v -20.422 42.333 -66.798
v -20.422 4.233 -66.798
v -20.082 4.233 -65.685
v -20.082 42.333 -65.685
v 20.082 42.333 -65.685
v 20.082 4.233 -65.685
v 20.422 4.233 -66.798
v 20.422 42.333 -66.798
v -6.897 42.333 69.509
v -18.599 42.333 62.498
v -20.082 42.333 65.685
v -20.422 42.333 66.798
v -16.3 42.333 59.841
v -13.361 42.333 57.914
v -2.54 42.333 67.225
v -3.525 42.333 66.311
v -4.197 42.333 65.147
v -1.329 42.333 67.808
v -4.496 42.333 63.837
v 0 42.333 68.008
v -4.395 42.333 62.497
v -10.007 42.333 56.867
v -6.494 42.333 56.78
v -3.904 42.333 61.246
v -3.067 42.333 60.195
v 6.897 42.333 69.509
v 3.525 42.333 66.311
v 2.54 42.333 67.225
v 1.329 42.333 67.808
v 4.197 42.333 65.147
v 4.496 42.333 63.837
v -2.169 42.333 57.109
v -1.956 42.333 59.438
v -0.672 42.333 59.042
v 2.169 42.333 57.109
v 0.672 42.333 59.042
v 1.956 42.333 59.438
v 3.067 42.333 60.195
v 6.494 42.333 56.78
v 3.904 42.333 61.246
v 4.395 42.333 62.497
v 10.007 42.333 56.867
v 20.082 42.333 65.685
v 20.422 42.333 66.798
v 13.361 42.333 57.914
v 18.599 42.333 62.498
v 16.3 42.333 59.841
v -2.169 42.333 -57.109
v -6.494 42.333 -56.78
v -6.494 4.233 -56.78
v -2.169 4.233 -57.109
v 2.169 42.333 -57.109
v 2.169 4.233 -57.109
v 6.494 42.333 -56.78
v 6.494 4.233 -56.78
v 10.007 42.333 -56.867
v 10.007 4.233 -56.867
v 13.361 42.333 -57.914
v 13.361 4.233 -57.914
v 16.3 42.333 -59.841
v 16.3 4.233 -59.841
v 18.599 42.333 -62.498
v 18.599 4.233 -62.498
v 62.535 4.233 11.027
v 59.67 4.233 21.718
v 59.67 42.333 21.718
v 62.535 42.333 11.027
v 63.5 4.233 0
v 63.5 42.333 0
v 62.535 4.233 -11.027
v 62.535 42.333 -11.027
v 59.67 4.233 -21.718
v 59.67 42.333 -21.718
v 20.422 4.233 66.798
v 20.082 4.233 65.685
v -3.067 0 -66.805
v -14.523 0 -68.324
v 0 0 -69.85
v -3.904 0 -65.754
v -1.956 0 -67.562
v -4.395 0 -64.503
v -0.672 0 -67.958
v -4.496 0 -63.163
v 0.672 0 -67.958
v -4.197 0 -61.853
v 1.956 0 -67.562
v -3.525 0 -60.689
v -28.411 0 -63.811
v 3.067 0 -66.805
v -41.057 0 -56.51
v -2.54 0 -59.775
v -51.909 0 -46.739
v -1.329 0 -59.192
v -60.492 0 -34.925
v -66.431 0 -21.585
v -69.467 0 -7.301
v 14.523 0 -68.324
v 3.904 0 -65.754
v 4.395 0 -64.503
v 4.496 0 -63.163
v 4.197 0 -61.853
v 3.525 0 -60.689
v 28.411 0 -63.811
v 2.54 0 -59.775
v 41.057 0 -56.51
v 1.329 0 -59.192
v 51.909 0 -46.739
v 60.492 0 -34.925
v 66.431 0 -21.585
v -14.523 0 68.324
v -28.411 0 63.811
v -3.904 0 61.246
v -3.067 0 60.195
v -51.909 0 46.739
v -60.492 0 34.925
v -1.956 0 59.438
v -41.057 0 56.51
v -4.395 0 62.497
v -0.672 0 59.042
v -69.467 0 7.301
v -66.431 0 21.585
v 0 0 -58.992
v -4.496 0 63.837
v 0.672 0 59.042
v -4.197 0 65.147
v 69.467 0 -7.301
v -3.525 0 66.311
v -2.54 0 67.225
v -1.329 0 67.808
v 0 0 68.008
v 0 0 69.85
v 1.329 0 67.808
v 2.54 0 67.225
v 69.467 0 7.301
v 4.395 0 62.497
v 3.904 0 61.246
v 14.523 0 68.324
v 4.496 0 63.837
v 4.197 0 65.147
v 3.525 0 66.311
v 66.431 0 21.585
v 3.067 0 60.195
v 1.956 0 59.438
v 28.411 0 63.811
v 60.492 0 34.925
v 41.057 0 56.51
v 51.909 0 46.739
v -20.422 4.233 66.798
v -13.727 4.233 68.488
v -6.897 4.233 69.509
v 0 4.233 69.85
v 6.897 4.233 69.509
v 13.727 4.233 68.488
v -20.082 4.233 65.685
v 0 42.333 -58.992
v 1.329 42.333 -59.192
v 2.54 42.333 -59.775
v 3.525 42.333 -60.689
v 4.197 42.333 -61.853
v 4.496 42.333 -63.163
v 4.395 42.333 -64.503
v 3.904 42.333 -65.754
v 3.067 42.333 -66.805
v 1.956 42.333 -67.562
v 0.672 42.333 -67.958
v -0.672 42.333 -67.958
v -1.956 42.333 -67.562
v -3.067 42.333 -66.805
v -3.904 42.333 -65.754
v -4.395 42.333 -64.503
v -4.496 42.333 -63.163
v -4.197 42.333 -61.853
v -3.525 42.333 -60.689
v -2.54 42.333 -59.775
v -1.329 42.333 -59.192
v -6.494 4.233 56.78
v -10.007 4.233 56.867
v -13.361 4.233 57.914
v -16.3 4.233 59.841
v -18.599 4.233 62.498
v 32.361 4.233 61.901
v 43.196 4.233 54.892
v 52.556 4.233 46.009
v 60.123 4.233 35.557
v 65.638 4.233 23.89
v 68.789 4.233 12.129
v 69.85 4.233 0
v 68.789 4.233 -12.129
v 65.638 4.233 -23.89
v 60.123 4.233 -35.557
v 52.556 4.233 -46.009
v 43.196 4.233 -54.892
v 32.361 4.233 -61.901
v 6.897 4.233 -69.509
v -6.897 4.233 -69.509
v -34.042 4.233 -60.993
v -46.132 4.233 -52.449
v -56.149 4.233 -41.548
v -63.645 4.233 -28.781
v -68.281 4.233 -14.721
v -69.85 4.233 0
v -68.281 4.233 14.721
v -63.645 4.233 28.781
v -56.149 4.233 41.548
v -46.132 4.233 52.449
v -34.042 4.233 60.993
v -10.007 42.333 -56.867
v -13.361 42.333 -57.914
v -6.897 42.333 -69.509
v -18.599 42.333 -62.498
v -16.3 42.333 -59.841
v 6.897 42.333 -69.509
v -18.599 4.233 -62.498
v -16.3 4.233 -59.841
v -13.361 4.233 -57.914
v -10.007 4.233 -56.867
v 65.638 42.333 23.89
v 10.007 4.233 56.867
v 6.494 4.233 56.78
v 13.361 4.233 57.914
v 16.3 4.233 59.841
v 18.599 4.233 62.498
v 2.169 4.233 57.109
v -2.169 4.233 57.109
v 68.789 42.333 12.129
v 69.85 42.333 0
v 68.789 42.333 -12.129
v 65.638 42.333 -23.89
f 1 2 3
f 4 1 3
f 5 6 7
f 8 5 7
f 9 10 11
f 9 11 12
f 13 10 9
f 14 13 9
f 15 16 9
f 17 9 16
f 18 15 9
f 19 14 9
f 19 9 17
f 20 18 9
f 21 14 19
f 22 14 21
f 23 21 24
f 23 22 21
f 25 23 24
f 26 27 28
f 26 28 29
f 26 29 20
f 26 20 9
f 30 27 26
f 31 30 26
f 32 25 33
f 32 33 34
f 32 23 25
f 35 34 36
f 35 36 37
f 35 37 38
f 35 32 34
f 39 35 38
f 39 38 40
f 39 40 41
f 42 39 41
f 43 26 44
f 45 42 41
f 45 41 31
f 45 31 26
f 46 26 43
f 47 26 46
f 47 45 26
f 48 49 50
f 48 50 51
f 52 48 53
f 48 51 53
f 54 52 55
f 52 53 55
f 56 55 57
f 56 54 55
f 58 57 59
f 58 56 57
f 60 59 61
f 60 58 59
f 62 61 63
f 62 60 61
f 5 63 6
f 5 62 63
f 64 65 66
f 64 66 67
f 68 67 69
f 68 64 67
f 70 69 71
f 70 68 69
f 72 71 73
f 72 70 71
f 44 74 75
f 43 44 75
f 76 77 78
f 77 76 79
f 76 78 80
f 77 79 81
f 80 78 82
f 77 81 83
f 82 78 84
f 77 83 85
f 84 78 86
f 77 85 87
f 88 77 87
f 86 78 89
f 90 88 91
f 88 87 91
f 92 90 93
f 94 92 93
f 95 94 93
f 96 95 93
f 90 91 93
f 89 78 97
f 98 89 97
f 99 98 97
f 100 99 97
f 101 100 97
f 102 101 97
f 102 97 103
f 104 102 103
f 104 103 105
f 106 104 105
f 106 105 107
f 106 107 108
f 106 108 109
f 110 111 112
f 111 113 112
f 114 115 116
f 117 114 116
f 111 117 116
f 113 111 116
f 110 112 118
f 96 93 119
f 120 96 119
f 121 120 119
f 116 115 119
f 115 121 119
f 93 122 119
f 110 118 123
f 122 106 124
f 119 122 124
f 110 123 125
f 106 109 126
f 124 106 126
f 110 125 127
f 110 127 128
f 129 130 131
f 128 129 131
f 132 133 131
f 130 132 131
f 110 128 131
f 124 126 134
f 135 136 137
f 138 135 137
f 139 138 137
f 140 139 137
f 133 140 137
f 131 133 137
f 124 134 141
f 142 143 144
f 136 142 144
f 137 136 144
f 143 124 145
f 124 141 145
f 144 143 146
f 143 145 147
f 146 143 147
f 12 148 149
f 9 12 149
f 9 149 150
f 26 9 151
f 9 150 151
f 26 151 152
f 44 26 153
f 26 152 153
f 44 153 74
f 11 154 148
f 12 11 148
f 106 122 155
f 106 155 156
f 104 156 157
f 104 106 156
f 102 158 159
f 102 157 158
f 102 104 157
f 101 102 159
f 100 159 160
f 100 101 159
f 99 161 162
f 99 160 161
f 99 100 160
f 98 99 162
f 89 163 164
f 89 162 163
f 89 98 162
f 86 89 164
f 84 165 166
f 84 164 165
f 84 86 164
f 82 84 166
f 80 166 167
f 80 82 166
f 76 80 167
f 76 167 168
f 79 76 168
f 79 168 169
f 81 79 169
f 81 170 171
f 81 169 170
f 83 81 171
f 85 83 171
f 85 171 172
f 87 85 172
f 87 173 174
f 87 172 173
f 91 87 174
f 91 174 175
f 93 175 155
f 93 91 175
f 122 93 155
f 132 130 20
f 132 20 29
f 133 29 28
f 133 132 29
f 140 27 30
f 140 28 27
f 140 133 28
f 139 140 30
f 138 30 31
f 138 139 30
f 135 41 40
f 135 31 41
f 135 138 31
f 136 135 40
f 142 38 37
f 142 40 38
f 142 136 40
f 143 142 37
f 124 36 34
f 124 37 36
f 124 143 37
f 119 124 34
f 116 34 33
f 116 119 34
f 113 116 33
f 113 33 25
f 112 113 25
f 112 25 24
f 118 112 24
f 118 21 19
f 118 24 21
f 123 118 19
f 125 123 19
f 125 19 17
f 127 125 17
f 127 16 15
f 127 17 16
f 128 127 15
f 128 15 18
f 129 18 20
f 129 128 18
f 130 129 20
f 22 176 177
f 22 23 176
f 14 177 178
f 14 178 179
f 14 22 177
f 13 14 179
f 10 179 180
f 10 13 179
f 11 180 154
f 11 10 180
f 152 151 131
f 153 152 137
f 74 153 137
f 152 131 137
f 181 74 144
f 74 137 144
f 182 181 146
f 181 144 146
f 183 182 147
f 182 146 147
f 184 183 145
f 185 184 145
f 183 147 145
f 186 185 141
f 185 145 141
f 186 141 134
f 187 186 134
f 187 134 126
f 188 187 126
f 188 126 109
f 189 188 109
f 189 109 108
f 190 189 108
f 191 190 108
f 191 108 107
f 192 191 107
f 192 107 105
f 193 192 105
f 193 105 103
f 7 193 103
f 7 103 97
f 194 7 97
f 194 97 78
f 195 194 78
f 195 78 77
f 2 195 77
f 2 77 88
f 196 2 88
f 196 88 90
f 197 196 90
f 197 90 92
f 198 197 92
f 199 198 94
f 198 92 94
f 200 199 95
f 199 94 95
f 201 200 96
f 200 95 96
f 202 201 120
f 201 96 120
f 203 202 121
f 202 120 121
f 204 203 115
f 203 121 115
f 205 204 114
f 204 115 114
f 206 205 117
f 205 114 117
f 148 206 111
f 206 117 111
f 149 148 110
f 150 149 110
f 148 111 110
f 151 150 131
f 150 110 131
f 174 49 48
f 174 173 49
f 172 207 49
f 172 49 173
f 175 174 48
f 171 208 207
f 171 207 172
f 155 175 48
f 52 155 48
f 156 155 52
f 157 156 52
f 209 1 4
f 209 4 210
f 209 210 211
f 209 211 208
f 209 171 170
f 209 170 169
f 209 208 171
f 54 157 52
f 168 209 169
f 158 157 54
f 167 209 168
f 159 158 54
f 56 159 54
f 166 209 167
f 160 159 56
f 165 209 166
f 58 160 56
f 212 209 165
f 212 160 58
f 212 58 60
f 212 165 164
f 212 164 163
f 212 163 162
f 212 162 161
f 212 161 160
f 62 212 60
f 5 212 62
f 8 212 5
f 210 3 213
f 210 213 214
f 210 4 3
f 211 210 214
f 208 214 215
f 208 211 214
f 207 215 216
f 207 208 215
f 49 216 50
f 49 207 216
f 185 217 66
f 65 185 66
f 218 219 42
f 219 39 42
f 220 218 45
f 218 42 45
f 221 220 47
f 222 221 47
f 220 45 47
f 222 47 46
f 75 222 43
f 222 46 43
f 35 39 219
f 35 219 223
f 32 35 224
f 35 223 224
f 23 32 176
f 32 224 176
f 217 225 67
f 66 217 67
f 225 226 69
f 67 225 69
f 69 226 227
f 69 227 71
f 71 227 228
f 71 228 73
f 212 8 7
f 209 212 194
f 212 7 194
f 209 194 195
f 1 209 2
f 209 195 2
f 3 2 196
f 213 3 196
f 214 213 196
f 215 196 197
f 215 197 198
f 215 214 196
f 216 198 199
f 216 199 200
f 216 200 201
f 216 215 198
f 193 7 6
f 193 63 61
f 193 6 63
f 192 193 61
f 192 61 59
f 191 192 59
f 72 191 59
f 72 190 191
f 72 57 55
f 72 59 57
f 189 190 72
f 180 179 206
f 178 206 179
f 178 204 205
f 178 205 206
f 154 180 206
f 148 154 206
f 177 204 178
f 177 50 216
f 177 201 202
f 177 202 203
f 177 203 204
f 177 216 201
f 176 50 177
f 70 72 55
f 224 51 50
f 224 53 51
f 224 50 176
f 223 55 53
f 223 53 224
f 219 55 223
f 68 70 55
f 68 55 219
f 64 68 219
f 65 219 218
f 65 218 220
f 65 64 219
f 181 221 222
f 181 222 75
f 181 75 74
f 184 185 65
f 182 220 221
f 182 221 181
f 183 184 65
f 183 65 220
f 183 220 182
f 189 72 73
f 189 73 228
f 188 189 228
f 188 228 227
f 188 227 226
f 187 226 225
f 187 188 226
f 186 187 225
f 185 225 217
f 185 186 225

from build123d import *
from build123d.topology import SkipClean

# Parameters (mm, degrees)
SKETCH2_R               = 69.85
BOSS_EXTRUDE1_DEPTH     = 4.233333
BOSS_EXTRUDE2_DEPTH     = 38.1
FILLET3_R               = 12.7
FILLET4_R               = 12.7
FILLET5_R               = 12.7
BOSS_EXTRUDE3_DEPTH     = 38.1
CUT_EXTRUDE1_DEPTH      = 108.471653
CUT_EXTRUDE1_DEPTH_BACK = 108.471653
SKETCH5_R               = 4.5085
FILLET6_R               = 12.7


with BuildPart() as part:
    # Sketch2 → Boss-Extrude1 (new body)
    with BuildSketch(Plane(origin=(0, 0, 0), x_dir=(1, 0, 0), z_dir=(0, 1, 0))):
        with Locations(Location((0, 0, 0), (0, 0, 270))):
            Circle(SKETCH2_R)
    extrude(amount=BOSS_EXTRUDE1_DEPTH)

    # Sketch3 → Boss-Extrude2 (add)
    with BuildSketch(Plane(origin=(0, 4.233333, 0), x_dir=(1, 0, 0), z_dir=(0, 1, 0))):
        with BuildLine():
            Line((-16.709043, -54.652817), (-20.422164, -66.797887))
            ThreePointArc((-20.422164, -66.797887), (0, -69.85), (20.422164, -66.797887))
            Line((20.422164, -66.797887), (16.709043, -54.652817))
            ThreePointArc((16.709043, -54.652817), (0, -57.15), (-16.709043, -54.652817))
        make_face()
        with BuildLine():
            ThreePointArc((20.422164, 66.797887), (0, 69.85), (-20.422164, 66.797887))
            Line((-20.422164, 66.797887), (-16.709043, 54.652817))
            ThreePointArc((-16.709043, 54.652817), (0, 57.15), (16.709043, 54.652817))
            Line((16.709043, 54.652817), (20.422164, 66.797887))
        make_face()
    extrude(amount=BOSS_EXTRUDE2_DEPTH)

    # Fillet3
    fillet3_edges = [part.edges().sort_by_distance(p)[0] for p in [
        (-16.709043, 23.283333, -54.652817),
    ]]
    fillet(fillet3_edges, radius=FILLET3_R)

    # Fillet4
    fillet4_edges = [part.edges().sort_by_distance(p)[0] for p in [
        (16.709043, 23.283333, 54.652817),
    ]]
    fillet(fillet4_edges, radius=FILLET4_R)

    # Fillet5
    fillet5_edges = [part.edges().sort_by_distance(p)[0] for p in [
        (-16.709043, 23.283333, 54.652817),
    ]]
    fillet(fillet5_edges, radius=FILLET5_R)

    # Sketch4 → Boss-Extrude3 (add)
    with SkipClean():  # the faces are left unmerged after this step: merging them gives an invalid solid
        with BuildSketch(Plane(origin=(0, 4.233333, 0), x_dir=(1, 0, 0), z_dir=(0, 1, 0))):
            with BuildLine():
                Line((59.670481, 21.718279), (65.63753, 23.890107))
                ThreePointArc((65.63753, 23.890107), (69.85, 0), (65.63753, -23.890107))
                Line((65.63753, -23.890107), (59.670481, -21.718279))
                ThreePointArc((59.670481, -21.718279), (63.5, 0), (59.670481, 21.718279))
            make_face()
        extrude(amount=BOSS_EXTRUDE3_DEPTH)

    # Sketch5 → Cut-Extrude1 (cut, two sides: drawn at the far end of the back side and taken through both)
    with SkipClean():  # the faces are left unmerged after this step: merging them gives an invalid solid
        with BuildSketch(Plane(origin=(0, 42.333333, 0), x_dir=(1, 0, 0), z_dir=(0, 1, 0)).offset(-CUT_EXTRUDE1_DEPTH_BACK)):
            with Locations(Location((0, 63.5, 0), (0, 0, 270))):
                Circle(SKETCH5_R)
            with Locations(Location((0, -63.5, 0), (0, 0, 270))):
                Circle(SKETCH5_R)
        extrude(amount=CUT_EXTRUDE1_DEPTH + CUT_EXTRUDE1_DEPTH_BACK, mode=Mode.SUBTRACT)

    # Fillet6
    fillet6_edges = [part.edges().sort_by_distance(p)[0] for p in [
        (16.709043, 23.283333, -54.652817),
    ]]
    fillet(fillet6_edges, radius=FILLET6_R)


solid = part.part
